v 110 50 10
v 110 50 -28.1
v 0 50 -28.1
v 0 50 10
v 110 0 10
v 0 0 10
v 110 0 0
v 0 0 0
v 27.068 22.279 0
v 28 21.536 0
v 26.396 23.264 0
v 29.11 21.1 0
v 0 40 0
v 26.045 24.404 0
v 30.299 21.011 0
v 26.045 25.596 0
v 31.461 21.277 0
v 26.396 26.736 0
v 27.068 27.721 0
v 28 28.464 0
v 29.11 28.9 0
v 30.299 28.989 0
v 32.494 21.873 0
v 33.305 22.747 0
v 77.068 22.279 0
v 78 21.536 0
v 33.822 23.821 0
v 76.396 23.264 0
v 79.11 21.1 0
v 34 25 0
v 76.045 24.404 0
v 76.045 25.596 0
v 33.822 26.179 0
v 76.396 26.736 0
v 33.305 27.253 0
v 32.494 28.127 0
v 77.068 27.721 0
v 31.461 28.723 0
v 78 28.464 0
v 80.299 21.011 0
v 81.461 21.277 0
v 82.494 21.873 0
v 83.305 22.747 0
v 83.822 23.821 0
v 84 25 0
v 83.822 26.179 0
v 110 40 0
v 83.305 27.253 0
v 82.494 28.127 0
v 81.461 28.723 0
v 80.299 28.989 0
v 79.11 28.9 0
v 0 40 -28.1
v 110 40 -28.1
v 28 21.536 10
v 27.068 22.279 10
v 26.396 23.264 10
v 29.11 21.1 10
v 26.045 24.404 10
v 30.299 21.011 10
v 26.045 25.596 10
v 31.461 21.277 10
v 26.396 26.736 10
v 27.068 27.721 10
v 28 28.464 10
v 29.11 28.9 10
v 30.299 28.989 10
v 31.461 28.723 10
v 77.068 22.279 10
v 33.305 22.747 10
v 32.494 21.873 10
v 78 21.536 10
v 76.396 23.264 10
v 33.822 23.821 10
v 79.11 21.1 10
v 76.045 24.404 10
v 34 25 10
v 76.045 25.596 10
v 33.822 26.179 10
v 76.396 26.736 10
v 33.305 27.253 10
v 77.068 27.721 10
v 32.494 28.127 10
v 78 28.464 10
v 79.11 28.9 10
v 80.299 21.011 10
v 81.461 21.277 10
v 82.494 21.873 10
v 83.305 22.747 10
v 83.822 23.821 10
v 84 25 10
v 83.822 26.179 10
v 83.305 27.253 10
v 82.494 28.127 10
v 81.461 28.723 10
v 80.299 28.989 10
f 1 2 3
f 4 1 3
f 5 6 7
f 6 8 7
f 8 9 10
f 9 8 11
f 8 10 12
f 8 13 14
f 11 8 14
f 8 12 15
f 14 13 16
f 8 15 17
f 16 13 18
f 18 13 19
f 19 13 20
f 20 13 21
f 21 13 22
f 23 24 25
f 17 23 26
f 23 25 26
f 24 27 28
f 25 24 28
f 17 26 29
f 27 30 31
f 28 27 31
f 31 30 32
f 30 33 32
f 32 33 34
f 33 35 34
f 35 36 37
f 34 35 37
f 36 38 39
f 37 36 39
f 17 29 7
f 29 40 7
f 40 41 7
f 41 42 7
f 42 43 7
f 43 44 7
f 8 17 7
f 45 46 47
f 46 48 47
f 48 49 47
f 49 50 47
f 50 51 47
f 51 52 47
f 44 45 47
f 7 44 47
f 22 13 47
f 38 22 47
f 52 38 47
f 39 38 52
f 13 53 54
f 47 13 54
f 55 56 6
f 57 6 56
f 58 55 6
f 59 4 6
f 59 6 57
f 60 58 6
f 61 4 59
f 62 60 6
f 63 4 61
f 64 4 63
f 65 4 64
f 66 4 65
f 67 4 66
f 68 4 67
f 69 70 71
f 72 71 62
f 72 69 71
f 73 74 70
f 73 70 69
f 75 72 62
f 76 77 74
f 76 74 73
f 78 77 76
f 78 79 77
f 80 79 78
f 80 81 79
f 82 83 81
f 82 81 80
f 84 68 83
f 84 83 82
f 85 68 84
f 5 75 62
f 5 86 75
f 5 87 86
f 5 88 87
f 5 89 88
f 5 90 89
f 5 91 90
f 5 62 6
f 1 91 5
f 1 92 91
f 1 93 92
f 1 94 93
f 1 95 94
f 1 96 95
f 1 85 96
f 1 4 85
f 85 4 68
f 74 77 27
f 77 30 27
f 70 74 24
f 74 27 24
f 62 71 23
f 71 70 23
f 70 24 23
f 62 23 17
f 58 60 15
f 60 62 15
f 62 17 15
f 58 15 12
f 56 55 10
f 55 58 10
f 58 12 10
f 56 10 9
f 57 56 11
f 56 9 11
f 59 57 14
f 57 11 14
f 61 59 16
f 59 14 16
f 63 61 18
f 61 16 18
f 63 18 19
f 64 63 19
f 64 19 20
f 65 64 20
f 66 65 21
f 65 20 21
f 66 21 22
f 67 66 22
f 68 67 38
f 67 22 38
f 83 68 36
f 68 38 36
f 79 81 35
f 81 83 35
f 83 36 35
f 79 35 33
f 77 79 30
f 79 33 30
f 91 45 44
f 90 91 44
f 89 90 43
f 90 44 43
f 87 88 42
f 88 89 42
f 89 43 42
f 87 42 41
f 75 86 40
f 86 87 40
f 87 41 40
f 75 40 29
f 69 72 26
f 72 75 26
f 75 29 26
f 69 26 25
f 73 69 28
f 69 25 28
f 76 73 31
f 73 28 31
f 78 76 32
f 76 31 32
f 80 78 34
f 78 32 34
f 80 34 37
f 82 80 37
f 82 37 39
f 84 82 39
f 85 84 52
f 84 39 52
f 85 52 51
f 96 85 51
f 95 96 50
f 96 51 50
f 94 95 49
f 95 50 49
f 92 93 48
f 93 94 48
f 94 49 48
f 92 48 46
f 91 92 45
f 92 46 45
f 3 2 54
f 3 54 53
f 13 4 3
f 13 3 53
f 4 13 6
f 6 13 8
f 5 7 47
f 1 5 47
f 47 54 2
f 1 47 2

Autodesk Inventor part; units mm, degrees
ref_plane "YZ Plane" through (0, 0, 0) normal (1, 0, 0) x (0, 1, 0)
ref_plane "XZ Plane" through (0, 0, 0) normal (0, 1, 0) x (-1, 0, 0)
ref_plane "XY Plane" through (0, 0, 0) normal (0, 0, 1) x (1, 0, 0)
sketch "Sketch1" plane through (0, 0, 0) normal (0, 0, 1) x (1, 0, 0)
  line L0 (0, 0) -> (110, 0)
  line L1 (110, 0) -> (110, 50)
  line L2 (110, 50) -> (0, 50)
  line L3 (0, 50) -> (0, 0)
  circle A0 centre (80, 25) radius 4
  circle A1 centre (30, 25) radius 4
  line L4 (30, 25) -> (80, 25) construction
  point P0 (110, 25)
  dimension "d0" = 110
  dimension "d1" = 50
  dimension "d2" = 8
  dimension "d3" = 8
  dimension "d4" = 50
  dimension "d5" = 30
extrude "Extrusion1" add sketch "Sketch1" along normal blind 10
sketch "Sketch2" plane through (0, 50, 0) normal (0, 1, 0) x (1, 0, 0)
  line L0 (110, -10) -> (0, -10) projected
  line L1 (0, -10) -> (110, -10)
  line L2 (110, -10) -> (110, 28.1)
  line L3 (110, 28.1) -> (0, 28.1)
  line L4 (0, 28.1) -> (0, -10)
  point P0 (0, 0)
  dimension "d8" = 38.1
extrude "Extrusion2" add sketch "Sketch2" against normal blind 10
properties part number "BA03"
